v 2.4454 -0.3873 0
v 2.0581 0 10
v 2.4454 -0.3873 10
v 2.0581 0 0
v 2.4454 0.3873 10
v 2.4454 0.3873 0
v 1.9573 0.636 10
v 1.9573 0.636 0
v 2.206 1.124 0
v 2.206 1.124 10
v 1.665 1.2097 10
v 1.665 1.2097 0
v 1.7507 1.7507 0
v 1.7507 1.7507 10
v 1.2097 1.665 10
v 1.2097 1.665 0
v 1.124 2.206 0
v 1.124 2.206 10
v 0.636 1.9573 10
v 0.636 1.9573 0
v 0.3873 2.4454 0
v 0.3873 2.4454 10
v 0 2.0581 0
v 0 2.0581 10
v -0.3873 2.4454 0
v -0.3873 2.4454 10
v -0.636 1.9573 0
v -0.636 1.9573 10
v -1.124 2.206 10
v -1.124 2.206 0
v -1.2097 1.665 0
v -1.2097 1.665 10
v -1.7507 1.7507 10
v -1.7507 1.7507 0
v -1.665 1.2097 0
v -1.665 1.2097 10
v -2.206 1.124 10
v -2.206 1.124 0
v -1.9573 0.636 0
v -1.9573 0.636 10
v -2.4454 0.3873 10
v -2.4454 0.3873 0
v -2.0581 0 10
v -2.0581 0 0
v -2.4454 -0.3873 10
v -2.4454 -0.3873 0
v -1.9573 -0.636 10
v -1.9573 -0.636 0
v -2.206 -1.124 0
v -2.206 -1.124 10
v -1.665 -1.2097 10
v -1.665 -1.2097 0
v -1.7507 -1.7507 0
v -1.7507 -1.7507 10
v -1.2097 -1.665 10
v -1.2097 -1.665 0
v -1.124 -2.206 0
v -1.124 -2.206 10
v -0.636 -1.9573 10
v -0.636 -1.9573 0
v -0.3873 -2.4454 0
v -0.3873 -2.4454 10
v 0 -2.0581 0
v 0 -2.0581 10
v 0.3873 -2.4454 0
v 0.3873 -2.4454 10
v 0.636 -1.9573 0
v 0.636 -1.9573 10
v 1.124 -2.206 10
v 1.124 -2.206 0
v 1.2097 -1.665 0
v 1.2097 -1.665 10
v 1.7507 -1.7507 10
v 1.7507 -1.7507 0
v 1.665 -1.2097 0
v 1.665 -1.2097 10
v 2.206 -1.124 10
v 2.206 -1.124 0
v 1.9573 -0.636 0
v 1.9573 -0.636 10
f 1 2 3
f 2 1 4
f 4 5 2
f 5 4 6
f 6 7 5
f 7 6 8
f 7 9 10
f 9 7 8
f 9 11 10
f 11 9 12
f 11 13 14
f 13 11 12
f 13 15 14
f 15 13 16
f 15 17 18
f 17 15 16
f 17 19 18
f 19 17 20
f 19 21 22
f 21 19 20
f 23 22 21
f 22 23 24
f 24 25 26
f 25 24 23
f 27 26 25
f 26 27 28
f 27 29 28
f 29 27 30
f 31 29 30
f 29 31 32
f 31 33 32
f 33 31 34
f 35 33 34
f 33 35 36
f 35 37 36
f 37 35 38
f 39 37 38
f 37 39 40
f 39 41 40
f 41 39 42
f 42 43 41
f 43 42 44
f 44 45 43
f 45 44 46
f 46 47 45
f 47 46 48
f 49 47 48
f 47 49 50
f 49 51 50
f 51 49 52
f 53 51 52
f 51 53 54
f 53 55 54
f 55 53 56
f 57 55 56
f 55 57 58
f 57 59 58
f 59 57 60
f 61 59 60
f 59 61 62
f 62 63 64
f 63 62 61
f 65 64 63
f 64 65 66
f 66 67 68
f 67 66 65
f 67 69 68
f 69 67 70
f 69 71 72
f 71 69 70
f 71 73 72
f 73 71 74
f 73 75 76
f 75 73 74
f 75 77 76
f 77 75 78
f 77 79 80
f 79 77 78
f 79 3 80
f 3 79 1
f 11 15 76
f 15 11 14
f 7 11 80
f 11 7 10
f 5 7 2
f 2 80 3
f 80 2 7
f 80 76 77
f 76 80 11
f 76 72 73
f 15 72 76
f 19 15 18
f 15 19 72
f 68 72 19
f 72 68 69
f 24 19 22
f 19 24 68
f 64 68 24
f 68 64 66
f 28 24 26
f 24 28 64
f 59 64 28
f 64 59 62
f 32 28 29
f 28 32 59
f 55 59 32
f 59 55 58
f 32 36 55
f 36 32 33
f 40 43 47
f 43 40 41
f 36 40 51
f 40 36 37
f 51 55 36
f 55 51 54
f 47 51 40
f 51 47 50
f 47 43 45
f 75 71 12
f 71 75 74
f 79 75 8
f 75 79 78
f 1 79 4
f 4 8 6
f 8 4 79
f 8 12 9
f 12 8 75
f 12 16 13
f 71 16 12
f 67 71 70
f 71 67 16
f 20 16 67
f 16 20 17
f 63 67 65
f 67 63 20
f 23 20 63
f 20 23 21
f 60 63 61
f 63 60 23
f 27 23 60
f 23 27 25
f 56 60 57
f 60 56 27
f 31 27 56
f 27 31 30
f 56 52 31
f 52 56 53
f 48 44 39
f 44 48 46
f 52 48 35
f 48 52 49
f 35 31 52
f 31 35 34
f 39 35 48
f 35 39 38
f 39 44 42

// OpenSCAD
$fn=100;

module gear_shaft(_r, _h, _teeth) {

	difference() {
		cylinder(r=_r, h=_h);

		for (_angle = [0 : 360 / _teeth : 359]) {
			translate([_r * cos(_angle), _r * sin(_angle), _h/2])
				rotate([0, 0, _angle + 45])
					cube([_r/4, _r/4, _h+2], true);
		}
	}

}

gear_shaft(2.5, 10, 20);
